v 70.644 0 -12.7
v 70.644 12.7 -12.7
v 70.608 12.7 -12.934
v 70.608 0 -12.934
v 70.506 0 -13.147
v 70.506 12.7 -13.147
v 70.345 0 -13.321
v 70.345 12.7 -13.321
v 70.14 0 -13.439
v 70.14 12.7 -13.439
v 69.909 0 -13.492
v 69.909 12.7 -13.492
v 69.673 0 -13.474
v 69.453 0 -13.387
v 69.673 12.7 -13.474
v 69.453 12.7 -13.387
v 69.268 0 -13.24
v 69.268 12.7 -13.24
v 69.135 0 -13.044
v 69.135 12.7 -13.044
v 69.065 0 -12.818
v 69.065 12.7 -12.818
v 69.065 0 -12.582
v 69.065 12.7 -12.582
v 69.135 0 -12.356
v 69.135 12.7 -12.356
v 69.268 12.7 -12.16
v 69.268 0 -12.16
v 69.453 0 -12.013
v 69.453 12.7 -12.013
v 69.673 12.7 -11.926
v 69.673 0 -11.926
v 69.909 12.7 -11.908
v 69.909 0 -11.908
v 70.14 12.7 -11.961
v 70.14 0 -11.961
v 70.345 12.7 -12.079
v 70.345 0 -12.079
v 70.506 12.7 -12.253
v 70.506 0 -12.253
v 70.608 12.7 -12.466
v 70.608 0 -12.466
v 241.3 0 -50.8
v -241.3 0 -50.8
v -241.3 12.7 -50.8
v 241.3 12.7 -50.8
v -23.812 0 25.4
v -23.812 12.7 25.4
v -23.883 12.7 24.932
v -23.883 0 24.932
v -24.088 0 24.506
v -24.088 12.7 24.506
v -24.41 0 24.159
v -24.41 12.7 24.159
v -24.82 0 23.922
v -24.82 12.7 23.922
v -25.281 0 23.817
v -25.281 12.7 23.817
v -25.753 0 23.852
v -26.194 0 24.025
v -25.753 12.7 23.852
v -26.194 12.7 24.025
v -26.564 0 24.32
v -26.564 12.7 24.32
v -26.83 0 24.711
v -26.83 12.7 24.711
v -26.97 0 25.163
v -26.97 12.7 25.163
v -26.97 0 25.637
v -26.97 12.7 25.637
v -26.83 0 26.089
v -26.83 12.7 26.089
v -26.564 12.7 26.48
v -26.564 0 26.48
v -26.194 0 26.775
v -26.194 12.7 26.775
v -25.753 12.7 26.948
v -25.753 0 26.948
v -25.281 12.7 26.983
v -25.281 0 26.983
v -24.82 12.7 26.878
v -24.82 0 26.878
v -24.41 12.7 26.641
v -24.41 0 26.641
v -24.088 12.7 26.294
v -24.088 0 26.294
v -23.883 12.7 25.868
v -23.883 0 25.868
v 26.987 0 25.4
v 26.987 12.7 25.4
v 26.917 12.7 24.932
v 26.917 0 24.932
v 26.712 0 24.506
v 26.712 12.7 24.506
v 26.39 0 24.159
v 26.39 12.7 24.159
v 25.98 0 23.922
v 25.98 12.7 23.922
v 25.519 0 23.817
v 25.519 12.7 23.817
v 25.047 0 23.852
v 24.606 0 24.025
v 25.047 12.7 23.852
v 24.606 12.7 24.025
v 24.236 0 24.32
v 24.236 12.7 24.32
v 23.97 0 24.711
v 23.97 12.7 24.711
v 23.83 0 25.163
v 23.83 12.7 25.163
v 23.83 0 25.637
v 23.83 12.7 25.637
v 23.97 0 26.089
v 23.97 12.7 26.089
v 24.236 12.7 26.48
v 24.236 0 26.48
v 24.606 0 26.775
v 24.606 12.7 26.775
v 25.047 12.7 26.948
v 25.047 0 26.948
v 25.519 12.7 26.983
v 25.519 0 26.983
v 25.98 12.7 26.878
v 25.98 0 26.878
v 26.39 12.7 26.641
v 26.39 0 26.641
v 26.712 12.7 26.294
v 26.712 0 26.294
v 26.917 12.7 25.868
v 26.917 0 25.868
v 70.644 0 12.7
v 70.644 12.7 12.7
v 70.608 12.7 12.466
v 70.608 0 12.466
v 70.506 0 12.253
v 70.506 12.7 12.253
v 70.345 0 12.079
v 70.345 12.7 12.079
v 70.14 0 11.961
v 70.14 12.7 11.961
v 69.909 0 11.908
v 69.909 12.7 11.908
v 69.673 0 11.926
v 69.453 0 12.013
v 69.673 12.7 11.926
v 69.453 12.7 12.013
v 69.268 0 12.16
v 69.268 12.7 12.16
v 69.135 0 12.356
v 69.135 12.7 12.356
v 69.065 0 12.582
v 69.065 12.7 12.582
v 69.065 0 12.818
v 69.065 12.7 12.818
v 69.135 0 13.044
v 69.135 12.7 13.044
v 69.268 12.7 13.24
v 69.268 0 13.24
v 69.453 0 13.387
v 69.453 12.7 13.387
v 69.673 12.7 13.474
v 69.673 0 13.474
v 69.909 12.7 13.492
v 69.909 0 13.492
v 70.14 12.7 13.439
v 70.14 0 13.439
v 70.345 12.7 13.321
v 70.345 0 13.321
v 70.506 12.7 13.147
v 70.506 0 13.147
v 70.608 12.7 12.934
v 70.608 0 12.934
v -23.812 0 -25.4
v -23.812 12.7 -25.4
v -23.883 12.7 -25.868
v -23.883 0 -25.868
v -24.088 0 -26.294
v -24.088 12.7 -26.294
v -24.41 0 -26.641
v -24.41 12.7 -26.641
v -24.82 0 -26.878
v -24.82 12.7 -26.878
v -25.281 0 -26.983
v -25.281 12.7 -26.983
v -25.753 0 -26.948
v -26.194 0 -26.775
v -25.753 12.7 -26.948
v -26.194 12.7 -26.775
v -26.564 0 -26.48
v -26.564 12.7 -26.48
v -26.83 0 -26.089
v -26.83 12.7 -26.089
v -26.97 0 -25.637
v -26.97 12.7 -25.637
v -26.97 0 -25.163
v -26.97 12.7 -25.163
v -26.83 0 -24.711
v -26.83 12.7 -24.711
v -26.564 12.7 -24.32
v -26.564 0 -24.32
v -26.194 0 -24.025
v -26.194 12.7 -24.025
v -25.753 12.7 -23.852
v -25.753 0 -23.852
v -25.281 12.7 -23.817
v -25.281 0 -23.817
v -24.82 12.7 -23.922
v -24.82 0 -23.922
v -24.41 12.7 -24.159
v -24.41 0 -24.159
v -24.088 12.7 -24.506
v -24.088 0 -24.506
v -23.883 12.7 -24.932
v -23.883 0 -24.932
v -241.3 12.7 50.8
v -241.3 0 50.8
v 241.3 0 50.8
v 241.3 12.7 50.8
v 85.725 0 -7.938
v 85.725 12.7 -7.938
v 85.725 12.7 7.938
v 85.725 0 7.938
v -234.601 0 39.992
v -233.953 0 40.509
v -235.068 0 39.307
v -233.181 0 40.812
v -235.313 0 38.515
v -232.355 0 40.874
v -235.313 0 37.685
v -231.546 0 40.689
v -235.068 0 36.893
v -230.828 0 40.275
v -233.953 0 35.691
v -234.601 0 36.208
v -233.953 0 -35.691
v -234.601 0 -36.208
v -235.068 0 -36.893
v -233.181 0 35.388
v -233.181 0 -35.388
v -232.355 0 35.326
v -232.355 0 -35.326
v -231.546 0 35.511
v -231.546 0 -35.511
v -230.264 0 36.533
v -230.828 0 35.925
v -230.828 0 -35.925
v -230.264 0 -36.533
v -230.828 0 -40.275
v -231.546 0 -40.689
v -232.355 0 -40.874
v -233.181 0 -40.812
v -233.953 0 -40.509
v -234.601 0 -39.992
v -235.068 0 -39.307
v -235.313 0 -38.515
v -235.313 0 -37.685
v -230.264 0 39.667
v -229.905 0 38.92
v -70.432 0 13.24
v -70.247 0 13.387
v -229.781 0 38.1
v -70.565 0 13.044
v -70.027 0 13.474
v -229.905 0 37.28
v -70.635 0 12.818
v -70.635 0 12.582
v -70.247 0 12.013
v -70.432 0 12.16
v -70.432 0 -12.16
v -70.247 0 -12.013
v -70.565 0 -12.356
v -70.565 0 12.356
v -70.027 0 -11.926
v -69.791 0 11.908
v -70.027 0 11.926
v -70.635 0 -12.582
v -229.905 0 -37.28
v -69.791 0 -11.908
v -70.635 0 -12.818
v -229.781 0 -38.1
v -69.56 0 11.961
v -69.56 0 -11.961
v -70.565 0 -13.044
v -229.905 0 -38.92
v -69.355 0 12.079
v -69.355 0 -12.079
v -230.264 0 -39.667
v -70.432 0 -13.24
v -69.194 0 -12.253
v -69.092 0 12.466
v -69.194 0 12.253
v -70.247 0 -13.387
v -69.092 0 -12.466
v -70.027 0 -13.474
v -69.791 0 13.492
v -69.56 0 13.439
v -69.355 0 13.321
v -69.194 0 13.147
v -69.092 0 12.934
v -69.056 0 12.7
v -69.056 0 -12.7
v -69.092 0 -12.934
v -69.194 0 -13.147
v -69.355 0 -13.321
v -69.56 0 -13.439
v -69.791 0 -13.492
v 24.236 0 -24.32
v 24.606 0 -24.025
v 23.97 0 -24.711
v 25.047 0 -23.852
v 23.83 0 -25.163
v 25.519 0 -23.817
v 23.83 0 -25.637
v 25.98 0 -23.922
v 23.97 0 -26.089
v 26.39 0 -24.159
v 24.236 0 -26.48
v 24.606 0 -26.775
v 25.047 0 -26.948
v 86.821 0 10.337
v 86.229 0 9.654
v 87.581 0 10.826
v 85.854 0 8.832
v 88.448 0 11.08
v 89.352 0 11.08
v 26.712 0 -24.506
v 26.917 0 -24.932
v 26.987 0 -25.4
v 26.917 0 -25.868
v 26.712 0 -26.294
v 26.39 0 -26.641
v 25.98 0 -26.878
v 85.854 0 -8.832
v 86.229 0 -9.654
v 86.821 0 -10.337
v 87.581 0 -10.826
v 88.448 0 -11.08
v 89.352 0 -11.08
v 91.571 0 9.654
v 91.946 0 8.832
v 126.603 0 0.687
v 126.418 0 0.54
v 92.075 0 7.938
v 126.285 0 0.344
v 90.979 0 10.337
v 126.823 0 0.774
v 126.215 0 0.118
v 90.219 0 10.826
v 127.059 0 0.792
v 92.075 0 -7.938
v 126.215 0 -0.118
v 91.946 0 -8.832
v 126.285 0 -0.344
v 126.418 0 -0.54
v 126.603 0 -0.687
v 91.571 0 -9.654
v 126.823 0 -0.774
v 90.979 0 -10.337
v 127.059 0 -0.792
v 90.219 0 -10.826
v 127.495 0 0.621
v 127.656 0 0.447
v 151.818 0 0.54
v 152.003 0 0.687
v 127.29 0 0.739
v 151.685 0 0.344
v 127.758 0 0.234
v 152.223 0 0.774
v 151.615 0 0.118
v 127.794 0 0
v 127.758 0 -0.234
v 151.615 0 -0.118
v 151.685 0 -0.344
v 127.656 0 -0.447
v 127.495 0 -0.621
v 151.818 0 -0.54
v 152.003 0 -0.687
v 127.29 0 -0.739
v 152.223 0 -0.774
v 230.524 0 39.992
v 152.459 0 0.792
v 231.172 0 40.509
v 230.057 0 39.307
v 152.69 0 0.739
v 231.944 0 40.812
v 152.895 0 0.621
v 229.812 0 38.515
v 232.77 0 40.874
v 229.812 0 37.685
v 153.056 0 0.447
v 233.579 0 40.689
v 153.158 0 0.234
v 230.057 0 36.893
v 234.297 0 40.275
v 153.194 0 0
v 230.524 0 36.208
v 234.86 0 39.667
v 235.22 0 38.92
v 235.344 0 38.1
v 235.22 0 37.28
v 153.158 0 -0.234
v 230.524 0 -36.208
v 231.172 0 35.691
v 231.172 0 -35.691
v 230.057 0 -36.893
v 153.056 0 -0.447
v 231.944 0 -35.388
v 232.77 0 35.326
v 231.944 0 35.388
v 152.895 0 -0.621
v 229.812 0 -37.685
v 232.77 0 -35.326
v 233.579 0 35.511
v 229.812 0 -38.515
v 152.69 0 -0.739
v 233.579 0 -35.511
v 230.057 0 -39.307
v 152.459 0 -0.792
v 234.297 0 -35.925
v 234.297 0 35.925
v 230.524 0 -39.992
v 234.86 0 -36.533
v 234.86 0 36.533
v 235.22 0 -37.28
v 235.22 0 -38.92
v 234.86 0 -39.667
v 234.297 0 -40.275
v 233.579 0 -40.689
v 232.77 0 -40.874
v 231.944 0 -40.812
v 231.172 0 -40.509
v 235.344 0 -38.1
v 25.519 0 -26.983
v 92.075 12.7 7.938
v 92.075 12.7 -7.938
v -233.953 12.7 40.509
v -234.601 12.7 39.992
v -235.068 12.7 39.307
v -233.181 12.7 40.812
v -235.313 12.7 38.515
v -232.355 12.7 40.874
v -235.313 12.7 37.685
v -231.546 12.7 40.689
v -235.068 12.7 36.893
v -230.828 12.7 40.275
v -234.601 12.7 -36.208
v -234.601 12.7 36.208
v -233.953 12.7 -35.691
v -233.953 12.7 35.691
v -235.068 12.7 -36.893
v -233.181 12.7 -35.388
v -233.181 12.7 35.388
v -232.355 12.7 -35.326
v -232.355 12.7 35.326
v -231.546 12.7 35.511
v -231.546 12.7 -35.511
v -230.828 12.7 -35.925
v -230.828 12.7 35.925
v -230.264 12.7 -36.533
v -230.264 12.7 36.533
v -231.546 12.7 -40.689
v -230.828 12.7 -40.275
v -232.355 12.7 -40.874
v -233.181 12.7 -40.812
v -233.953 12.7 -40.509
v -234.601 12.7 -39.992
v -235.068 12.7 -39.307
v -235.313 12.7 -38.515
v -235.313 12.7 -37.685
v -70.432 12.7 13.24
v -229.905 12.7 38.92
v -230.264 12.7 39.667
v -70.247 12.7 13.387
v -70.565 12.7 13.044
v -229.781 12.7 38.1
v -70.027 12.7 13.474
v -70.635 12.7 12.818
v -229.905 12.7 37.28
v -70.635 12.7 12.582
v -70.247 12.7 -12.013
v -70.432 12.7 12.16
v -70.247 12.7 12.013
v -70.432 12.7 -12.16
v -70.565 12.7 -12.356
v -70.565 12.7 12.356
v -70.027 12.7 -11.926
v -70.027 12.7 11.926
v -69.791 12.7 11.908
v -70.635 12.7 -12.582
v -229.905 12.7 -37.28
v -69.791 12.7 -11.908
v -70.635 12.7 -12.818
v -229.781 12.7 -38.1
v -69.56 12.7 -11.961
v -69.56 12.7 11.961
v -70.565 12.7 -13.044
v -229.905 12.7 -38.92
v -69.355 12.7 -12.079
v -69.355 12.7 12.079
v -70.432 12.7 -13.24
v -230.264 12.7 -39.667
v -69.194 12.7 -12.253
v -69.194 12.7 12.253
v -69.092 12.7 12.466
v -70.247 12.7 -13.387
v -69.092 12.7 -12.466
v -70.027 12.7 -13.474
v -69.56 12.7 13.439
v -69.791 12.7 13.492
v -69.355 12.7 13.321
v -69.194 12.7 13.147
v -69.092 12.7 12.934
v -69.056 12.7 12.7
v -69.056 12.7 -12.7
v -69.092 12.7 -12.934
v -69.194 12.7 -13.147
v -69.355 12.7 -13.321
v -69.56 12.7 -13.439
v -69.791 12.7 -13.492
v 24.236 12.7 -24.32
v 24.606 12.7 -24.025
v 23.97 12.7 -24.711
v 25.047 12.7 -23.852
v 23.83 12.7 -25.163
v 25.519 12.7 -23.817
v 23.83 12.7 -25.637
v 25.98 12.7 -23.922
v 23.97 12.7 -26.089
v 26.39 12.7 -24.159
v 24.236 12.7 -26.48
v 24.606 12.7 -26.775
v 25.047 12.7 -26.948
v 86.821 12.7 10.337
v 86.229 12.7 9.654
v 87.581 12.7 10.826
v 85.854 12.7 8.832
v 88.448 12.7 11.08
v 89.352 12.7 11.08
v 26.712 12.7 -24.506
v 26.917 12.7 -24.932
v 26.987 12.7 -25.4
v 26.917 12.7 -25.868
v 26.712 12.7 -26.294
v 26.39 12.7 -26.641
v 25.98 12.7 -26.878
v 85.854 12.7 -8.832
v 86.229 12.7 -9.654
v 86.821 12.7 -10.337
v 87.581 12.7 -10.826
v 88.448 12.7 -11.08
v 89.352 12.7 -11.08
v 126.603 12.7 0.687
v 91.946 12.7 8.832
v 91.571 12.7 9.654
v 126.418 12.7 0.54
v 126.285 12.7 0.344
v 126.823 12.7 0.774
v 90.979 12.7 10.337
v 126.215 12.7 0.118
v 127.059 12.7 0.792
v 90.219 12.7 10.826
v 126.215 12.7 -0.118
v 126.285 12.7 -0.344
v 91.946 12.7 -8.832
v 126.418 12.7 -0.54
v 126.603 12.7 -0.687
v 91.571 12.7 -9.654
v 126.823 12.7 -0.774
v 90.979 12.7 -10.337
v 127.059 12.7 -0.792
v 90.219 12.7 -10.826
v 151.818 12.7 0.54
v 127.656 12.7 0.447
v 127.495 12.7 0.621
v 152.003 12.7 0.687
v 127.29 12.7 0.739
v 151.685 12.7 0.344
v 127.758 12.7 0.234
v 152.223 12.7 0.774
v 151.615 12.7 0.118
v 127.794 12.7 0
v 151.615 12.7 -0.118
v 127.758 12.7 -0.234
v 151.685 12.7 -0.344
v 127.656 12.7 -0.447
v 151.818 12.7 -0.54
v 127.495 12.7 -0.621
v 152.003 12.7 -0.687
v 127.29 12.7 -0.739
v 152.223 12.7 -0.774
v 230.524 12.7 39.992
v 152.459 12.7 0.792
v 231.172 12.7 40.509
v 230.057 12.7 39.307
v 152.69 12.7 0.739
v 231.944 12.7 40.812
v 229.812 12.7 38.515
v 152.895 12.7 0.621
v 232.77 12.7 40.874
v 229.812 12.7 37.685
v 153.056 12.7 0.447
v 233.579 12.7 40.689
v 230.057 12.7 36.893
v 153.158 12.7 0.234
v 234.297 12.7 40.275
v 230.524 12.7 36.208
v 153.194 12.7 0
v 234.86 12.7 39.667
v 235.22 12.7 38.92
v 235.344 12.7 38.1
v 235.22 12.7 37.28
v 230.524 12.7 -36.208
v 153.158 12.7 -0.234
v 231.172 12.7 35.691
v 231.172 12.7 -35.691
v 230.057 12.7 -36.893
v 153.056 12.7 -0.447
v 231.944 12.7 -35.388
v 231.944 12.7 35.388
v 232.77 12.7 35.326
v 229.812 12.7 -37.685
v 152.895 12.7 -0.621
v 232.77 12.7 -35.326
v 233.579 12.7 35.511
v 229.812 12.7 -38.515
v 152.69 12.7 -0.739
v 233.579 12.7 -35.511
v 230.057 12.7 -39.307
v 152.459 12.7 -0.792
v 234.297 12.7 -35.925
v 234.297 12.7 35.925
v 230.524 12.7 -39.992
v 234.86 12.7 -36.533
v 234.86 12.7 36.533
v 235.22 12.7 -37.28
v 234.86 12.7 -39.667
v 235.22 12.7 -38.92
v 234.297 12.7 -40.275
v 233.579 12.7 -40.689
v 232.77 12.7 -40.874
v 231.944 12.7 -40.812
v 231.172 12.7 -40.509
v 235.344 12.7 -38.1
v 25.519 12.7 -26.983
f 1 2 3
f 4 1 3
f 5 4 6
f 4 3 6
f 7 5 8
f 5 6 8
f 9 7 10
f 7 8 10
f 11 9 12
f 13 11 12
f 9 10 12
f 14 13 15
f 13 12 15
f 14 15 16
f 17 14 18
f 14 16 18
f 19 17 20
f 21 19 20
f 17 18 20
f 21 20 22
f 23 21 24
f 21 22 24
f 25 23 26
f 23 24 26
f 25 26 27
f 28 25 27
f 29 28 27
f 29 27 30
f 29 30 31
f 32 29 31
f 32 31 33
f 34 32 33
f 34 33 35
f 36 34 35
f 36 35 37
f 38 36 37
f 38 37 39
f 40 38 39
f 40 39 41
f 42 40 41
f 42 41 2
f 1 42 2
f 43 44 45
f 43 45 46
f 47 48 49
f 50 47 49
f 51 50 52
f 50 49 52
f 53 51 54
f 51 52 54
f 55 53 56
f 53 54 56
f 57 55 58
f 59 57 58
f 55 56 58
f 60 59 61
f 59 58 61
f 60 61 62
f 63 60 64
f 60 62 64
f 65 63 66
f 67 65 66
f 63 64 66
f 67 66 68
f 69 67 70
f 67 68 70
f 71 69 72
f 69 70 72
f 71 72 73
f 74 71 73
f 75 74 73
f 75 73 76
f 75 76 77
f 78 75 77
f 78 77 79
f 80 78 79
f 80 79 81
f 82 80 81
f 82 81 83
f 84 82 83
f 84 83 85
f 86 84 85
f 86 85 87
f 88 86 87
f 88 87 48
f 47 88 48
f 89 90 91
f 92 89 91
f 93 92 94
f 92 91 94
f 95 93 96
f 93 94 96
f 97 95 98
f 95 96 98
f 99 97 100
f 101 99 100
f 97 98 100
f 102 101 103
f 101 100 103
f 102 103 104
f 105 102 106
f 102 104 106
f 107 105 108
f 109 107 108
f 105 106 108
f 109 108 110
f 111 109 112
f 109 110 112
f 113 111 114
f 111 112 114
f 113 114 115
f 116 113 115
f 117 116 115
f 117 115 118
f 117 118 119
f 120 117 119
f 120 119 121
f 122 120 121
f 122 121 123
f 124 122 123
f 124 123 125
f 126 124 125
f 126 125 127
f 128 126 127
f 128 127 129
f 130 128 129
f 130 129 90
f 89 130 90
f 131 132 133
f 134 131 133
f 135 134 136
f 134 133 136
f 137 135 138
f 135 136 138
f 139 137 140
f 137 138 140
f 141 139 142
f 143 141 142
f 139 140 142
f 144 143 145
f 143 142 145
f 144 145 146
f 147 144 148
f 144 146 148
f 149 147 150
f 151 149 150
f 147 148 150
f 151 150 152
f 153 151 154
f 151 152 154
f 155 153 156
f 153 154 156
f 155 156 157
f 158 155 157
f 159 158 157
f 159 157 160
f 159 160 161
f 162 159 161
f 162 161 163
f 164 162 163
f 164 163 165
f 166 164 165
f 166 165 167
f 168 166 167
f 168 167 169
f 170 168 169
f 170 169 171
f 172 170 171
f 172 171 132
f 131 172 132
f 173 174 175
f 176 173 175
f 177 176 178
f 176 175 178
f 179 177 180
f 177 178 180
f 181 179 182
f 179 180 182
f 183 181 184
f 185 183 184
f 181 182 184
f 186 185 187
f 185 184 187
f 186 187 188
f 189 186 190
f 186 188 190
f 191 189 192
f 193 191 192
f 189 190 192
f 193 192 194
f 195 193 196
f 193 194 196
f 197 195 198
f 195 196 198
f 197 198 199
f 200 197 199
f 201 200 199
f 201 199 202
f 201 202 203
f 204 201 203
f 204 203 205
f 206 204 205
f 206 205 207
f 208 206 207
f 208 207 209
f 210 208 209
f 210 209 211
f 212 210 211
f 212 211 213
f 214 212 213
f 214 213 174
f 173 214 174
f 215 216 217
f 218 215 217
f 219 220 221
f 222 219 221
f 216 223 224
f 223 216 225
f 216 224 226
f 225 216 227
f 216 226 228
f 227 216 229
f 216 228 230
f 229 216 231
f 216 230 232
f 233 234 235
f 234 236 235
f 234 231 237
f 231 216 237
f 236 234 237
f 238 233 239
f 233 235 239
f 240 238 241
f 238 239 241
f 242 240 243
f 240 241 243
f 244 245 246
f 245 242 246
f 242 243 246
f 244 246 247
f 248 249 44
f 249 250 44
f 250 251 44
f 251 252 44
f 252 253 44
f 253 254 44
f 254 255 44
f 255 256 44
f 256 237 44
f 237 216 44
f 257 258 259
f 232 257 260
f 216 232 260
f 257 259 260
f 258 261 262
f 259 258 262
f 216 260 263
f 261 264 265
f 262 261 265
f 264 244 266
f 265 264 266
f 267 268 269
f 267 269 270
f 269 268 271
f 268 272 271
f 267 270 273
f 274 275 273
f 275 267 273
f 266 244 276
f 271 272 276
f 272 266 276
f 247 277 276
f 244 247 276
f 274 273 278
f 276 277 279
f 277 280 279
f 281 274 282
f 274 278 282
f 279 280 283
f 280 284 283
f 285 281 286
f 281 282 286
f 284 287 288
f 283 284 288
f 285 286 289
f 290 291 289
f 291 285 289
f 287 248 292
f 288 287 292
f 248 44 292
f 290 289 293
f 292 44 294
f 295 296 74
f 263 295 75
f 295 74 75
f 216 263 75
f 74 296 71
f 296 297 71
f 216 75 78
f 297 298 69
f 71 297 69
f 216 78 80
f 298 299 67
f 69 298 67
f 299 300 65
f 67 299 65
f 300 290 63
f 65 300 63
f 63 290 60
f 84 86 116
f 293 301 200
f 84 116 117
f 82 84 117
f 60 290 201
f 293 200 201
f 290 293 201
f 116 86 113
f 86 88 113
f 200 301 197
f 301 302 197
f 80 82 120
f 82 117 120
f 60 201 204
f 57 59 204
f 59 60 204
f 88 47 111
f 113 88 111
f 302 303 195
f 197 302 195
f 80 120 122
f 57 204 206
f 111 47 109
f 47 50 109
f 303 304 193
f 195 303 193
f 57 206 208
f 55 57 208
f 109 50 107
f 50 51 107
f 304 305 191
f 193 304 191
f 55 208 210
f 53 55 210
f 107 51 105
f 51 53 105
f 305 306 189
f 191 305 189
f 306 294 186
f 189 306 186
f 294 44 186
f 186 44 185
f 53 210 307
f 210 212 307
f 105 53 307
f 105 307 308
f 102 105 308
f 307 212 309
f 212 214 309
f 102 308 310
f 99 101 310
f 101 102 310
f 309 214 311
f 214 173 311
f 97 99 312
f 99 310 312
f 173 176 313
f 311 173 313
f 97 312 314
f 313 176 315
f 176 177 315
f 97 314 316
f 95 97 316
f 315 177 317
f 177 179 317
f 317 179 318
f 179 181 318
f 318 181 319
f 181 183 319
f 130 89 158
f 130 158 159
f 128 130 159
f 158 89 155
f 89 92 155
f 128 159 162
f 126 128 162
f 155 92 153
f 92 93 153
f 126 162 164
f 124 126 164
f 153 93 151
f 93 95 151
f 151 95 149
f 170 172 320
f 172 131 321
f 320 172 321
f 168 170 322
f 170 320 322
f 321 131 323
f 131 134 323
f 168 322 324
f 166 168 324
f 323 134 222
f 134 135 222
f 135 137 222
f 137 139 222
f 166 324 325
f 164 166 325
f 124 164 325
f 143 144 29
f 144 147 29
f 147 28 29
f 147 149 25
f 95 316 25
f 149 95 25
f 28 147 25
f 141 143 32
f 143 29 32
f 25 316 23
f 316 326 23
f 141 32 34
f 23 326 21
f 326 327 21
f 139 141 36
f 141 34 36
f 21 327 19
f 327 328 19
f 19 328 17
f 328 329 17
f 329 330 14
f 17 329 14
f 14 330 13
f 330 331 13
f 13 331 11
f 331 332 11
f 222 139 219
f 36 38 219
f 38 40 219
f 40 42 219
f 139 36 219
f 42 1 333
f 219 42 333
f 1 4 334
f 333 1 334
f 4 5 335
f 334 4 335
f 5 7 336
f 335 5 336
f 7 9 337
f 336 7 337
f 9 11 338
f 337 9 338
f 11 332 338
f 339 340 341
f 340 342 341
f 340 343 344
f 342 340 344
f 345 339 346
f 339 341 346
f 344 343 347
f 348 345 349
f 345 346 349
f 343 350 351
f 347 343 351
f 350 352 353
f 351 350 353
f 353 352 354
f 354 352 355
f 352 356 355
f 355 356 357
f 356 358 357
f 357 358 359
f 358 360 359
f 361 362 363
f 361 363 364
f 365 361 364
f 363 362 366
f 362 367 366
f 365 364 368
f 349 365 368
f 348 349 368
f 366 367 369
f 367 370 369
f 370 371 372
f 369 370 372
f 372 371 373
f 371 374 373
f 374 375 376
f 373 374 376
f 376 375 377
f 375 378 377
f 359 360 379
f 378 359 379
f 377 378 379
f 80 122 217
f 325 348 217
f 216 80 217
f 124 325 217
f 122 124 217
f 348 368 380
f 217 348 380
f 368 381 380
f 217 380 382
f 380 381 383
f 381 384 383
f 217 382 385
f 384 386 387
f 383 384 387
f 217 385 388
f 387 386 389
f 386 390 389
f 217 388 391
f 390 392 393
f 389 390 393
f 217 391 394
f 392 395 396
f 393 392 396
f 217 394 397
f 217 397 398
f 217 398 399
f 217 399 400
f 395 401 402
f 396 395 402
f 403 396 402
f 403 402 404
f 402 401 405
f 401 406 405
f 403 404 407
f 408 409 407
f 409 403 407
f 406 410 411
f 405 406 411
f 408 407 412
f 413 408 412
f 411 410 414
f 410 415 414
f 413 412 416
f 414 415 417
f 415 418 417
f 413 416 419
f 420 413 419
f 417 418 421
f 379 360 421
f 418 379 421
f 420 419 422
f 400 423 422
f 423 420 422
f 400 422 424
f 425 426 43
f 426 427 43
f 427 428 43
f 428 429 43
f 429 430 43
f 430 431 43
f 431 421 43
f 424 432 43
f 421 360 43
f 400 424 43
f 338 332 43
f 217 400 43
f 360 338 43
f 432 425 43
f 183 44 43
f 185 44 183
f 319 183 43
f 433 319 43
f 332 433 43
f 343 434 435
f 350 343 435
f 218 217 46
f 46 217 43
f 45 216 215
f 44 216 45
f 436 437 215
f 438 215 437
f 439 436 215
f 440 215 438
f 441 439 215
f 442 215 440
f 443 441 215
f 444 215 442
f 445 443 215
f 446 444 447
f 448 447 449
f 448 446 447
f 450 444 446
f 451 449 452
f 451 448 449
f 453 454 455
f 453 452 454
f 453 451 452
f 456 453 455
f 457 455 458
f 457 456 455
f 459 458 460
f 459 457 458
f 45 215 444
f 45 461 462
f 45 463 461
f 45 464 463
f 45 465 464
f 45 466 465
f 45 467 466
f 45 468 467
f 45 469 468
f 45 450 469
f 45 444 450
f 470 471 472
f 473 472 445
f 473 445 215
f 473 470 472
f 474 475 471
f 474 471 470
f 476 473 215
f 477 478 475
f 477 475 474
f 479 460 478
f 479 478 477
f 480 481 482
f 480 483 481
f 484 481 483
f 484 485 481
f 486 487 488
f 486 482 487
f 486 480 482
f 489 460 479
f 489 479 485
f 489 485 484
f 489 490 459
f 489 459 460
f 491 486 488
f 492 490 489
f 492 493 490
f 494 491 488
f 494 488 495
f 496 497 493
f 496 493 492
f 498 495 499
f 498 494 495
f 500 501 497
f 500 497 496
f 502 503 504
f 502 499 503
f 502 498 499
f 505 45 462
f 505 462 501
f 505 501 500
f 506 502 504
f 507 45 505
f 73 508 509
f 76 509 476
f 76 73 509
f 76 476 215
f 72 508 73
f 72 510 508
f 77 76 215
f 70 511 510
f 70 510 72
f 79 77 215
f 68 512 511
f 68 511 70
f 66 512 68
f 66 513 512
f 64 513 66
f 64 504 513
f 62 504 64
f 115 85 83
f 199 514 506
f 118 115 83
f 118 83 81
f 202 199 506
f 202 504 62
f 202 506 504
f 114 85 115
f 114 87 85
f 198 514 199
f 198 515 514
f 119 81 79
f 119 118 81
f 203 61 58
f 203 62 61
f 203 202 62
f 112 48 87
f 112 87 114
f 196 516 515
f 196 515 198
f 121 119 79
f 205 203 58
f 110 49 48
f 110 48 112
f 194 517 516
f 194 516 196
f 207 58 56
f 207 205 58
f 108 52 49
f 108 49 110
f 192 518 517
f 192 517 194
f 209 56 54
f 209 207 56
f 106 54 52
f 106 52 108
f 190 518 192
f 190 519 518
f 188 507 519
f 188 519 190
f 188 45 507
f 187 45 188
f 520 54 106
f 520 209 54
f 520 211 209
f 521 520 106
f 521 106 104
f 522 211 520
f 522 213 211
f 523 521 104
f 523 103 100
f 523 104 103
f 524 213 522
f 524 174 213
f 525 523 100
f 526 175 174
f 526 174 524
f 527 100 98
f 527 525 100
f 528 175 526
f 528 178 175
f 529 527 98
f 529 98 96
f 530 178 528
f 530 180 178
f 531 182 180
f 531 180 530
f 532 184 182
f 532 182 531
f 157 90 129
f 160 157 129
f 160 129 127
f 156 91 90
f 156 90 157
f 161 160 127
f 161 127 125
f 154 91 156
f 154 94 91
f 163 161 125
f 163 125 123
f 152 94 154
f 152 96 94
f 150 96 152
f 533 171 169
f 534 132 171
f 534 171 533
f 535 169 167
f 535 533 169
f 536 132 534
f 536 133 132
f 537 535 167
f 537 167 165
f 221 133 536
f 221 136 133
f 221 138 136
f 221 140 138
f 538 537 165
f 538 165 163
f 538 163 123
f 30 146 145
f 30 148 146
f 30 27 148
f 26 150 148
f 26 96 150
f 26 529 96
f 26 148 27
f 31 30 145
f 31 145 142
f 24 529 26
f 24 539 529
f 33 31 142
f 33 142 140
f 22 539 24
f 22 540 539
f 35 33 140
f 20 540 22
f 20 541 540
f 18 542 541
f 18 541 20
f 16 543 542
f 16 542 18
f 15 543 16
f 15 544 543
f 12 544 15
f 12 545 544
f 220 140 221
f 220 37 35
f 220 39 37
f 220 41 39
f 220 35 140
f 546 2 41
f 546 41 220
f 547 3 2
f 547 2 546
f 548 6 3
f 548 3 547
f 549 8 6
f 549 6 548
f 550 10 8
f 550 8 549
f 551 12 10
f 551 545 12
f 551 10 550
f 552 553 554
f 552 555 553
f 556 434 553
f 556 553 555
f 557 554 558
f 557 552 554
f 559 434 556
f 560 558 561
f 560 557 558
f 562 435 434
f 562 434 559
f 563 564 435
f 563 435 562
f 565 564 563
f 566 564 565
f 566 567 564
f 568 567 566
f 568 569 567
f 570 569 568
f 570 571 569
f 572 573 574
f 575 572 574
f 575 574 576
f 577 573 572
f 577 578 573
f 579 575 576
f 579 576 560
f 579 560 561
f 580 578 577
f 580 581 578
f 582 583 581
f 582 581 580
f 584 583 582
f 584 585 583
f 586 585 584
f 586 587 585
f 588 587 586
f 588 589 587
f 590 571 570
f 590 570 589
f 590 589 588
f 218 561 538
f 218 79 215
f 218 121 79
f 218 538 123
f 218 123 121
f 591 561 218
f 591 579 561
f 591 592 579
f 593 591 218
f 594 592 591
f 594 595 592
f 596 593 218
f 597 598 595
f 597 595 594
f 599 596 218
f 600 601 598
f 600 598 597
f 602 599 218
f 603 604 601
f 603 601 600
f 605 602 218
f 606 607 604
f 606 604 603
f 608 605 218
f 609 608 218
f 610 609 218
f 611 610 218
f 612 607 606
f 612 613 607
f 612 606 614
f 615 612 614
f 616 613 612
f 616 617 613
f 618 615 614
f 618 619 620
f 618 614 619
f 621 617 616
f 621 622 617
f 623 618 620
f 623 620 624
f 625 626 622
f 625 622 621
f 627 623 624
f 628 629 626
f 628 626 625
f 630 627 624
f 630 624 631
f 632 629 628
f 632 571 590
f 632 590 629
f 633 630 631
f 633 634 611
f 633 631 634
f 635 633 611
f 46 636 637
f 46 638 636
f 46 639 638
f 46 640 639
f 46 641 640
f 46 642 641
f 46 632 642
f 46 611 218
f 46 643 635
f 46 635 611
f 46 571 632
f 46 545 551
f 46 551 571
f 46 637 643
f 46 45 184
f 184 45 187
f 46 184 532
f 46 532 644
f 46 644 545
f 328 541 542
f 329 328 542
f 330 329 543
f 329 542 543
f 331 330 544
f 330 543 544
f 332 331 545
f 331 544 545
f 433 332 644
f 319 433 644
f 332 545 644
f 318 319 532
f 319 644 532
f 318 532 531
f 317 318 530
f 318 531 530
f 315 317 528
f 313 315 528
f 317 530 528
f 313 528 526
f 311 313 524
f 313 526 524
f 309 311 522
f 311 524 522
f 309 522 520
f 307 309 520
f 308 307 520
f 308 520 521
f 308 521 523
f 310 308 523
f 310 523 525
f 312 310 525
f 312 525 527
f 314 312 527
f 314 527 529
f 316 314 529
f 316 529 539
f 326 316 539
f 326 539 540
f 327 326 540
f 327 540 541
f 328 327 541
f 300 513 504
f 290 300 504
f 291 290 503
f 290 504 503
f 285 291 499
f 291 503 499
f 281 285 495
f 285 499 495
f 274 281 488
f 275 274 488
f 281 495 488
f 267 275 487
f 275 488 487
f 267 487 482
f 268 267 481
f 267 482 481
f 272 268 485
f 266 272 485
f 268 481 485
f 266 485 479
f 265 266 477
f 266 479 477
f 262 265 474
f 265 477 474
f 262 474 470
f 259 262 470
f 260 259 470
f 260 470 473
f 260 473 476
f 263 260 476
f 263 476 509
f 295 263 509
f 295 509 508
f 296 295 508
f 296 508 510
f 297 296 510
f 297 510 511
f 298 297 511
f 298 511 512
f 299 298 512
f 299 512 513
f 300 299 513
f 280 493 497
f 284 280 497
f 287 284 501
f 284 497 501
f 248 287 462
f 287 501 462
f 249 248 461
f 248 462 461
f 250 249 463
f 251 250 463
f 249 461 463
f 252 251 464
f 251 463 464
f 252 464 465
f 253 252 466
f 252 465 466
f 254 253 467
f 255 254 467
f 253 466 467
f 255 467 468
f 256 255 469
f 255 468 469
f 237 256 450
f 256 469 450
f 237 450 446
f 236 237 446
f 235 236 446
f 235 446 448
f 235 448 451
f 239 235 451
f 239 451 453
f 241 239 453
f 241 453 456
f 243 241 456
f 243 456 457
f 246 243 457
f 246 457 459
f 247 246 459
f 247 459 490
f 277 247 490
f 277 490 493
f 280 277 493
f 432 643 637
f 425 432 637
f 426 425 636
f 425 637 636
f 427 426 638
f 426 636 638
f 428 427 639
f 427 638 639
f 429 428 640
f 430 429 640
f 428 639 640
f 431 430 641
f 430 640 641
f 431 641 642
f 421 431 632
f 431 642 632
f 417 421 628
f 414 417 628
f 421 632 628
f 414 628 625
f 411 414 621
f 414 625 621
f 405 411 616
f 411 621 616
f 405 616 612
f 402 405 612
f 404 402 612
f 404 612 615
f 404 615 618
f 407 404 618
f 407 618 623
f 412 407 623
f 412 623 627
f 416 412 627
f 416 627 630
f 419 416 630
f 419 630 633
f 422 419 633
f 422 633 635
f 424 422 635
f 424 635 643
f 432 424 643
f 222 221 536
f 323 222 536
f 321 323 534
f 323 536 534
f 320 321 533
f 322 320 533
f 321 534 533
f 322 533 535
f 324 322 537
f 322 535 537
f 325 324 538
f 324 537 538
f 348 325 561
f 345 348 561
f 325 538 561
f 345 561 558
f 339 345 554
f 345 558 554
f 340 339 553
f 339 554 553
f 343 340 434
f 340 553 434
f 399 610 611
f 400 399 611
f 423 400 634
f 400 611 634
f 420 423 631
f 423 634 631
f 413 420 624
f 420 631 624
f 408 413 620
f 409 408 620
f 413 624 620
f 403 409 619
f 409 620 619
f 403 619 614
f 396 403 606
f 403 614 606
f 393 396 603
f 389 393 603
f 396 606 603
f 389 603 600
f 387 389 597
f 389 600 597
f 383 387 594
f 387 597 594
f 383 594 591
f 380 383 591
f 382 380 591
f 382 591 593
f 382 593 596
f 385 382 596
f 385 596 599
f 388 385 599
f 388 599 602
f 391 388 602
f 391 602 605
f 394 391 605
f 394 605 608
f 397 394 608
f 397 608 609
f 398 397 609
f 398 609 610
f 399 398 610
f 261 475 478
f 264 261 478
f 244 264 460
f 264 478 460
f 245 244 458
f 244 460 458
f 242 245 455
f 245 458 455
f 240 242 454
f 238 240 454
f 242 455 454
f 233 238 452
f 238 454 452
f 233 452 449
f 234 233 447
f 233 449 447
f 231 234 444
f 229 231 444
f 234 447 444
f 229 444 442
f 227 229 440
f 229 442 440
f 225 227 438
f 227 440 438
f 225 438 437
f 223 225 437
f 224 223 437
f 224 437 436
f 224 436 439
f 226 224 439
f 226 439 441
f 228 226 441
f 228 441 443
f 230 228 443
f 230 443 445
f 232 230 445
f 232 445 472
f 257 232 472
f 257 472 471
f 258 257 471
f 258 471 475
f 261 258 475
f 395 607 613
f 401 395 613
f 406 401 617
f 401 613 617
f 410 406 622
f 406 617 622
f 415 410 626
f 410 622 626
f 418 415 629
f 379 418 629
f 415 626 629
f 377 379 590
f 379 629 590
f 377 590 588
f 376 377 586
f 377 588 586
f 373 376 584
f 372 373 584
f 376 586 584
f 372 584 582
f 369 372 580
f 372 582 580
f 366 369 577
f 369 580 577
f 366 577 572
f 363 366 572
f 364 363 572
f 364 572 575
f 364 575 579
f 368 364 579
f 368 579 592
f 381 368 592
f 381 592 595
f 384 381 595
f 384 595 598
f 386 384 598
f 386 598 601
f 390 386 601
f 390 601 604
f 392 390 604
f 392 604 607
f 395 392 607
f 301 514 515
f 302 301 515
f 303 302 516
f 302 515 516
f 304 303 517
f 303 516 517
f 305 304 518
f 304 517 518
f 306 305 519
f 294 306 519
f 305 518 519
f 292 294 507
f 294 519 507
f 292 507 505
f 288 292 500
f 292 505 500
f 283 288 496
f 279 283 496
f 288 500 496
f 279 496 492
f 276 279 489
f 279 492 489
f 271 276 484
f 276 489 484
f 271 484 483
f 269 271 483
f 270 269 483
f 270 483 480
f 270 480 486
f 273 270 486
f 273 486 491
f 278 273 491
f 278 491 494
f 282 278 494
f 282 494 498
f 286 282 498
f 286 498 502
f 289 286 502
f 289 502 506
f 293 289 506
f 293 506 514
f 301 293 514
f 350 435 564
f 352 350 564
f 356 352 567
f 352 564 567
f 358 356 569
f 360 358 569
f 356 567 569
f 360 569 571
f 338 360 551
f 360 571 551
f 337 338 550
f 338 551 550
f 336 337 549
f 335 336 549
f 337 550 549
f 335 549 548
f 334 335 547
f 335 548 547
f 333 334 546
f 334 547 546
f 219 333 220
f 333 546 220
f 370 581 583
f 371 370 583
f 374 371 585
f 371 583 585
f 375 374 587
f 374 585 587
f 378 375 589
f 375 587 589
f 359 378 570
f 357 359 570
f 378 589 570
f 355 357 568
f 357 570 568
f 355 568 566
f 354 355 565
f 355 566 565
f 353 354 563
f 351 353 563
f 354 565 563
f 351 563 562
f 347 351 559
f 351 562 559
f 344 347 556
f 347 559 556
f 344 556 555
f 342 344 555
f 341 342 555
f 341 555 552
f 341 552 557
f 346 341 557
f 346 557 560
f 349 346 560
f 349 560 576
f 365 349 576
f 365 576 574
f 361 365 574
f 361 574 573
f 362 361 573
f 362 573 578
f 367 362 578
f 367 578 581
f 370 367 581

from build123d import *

# Parameters (mm, degrees)
SKETCH1_W           = 482.6
SKETCH1_H           = 101.6
BOSS_EXTRUDE1_DEPTH = 12.7
SKETCH2_R           = 2.7813
CUT_EXTRUDE1_DEPTH  = 13.7
SKETCH3_R           = 1.5875
CUT_EXTRUDE2_DEPTH  = 13.7
SKETCH4_R           = 0.79375
CUT_EXTRUDE3_DEPTH  = 13.7
SKETCH5_R           = 0.79375
CUT_EXTRUDE4_DEPTH  = 13.7
CUT_EXTRUDE5_DEPTH  = 13.7


with BuildPart() as part:
    # Sketch1 → Boss-Extrude1 (new body)
    with BuildSketch(Plane(origin=(0, 0, 0), x_dir=(1, 0, 0), z_dir=(0, 1, 0))):
        Rectangle(SKETCH1_W, SKETCH1_H)
    extrude(amount=BOSS_EXTRUDE1_DEPTH)

    # Sketch2 → Cut-Extrude1 (cut, through all)
    with BuildSketch(Plane(origin=(0, 12.7, 0), x_dir=(1, 0, 0), z_dir=(0, 1, 0))):
        with Locations((-232.5624, 38.1)):
            Circle(SKETCH2_R)
        with Locations((-232.5624, -38.1)):
            Circle(SKETCH2_R)
        with Locations((232.5624, 38.1)):
            Circle(SKETCH2_R)
        with Locations((232.5624, -38.1)):
            Circle(SKETCH2_R)
    extrude(amount=-CUT_EXTRUDE1_DEPTH, mode=Mode.SUBTRACT)

    # Sketch3 → Cut-Extrude2 (cut, through all)
    with BuildSketch(Plane(origin=(0, 12.7, 0), x_dir=(1, 0, 0), z_dir=(0, 1, 0))):
        with Locations((-25.4, 25.4)):
            Circle(SKETCH3_R)
        with Locations((25.4, 25.4)):
            Circle(SKETCH3_R)
        with Locations((25.4, -25.4)):
            Circle(SKETCH3_R)
        with Locations((-25.4, -25.4)):
            Circle(SKETCH3_R)
    extrude(amount=-CUT_EXTRUDE2_DEPTH, mode=Mode.SUBTRACT)

    # Sketch4 → Cut-Extrude3 (cut, through all)
    with BuildSketch(Plane(origin=(0, 12.7, 0), x_dir=(1, 0, 0), z_dir=(0, 1, 0))):
        with Locations((-69.85, 12.7)):
            Circle(SKETCH4_R)
        with Locations((-69.85, -12.7)):
            Circle(SKETCH4_R)
        with Locations((69.85, -12.7)):
            Circle(SKETCH4_R)
        with Locations((69.85, 12.7)):
            Circle(SKETCH4_R)
    extrude(amount=-CUT_EXTRUDE3_DEPTH, mode=Mode.SUBTRACT)

    # Sketch5 → Cut-Extrude4 (cut, through all)
    with BuildSketch(Plane(origin=(0, 12.7, 0), x_dir=(1, 0, 0), z_dir=(0, 1, 0))):
        with Locations((127, 0)):
            Circle(SKETCH5_R)
        with Locations((152.4, 0)):
            Circle(SKETCH5_R)
    extrude(amount=-CUT_EXTRUDE4_DEPTH, mode=Mode.SUBTRACT)

    # Sketch6 → Cut-Extrude5 (cut, through all)
    with BuildSketch(Plane(origin=(0, 12.7, 0), x_dir=(1, 0, 0), z_dir=(0, 1, 0))):
        with BuildLine():
            Line((85.725, 7.9375), (85.725, -7.9375))
            ThreePointArc((85.725, -7.9375), (88.9, -11.1125), (92.075, -7.9375))
            Line((92.075, -7.9375), (92.075, 7.9375))
            ThreePointArc((92.075, 7.9375), (88.9, 11.1125), (85.725, 7.9375))
        make_face()
    extrude(amount=-CUT_EXTRUDE5_DEPTH, mode=Mode.SUBTRACT)


solid = part.part
